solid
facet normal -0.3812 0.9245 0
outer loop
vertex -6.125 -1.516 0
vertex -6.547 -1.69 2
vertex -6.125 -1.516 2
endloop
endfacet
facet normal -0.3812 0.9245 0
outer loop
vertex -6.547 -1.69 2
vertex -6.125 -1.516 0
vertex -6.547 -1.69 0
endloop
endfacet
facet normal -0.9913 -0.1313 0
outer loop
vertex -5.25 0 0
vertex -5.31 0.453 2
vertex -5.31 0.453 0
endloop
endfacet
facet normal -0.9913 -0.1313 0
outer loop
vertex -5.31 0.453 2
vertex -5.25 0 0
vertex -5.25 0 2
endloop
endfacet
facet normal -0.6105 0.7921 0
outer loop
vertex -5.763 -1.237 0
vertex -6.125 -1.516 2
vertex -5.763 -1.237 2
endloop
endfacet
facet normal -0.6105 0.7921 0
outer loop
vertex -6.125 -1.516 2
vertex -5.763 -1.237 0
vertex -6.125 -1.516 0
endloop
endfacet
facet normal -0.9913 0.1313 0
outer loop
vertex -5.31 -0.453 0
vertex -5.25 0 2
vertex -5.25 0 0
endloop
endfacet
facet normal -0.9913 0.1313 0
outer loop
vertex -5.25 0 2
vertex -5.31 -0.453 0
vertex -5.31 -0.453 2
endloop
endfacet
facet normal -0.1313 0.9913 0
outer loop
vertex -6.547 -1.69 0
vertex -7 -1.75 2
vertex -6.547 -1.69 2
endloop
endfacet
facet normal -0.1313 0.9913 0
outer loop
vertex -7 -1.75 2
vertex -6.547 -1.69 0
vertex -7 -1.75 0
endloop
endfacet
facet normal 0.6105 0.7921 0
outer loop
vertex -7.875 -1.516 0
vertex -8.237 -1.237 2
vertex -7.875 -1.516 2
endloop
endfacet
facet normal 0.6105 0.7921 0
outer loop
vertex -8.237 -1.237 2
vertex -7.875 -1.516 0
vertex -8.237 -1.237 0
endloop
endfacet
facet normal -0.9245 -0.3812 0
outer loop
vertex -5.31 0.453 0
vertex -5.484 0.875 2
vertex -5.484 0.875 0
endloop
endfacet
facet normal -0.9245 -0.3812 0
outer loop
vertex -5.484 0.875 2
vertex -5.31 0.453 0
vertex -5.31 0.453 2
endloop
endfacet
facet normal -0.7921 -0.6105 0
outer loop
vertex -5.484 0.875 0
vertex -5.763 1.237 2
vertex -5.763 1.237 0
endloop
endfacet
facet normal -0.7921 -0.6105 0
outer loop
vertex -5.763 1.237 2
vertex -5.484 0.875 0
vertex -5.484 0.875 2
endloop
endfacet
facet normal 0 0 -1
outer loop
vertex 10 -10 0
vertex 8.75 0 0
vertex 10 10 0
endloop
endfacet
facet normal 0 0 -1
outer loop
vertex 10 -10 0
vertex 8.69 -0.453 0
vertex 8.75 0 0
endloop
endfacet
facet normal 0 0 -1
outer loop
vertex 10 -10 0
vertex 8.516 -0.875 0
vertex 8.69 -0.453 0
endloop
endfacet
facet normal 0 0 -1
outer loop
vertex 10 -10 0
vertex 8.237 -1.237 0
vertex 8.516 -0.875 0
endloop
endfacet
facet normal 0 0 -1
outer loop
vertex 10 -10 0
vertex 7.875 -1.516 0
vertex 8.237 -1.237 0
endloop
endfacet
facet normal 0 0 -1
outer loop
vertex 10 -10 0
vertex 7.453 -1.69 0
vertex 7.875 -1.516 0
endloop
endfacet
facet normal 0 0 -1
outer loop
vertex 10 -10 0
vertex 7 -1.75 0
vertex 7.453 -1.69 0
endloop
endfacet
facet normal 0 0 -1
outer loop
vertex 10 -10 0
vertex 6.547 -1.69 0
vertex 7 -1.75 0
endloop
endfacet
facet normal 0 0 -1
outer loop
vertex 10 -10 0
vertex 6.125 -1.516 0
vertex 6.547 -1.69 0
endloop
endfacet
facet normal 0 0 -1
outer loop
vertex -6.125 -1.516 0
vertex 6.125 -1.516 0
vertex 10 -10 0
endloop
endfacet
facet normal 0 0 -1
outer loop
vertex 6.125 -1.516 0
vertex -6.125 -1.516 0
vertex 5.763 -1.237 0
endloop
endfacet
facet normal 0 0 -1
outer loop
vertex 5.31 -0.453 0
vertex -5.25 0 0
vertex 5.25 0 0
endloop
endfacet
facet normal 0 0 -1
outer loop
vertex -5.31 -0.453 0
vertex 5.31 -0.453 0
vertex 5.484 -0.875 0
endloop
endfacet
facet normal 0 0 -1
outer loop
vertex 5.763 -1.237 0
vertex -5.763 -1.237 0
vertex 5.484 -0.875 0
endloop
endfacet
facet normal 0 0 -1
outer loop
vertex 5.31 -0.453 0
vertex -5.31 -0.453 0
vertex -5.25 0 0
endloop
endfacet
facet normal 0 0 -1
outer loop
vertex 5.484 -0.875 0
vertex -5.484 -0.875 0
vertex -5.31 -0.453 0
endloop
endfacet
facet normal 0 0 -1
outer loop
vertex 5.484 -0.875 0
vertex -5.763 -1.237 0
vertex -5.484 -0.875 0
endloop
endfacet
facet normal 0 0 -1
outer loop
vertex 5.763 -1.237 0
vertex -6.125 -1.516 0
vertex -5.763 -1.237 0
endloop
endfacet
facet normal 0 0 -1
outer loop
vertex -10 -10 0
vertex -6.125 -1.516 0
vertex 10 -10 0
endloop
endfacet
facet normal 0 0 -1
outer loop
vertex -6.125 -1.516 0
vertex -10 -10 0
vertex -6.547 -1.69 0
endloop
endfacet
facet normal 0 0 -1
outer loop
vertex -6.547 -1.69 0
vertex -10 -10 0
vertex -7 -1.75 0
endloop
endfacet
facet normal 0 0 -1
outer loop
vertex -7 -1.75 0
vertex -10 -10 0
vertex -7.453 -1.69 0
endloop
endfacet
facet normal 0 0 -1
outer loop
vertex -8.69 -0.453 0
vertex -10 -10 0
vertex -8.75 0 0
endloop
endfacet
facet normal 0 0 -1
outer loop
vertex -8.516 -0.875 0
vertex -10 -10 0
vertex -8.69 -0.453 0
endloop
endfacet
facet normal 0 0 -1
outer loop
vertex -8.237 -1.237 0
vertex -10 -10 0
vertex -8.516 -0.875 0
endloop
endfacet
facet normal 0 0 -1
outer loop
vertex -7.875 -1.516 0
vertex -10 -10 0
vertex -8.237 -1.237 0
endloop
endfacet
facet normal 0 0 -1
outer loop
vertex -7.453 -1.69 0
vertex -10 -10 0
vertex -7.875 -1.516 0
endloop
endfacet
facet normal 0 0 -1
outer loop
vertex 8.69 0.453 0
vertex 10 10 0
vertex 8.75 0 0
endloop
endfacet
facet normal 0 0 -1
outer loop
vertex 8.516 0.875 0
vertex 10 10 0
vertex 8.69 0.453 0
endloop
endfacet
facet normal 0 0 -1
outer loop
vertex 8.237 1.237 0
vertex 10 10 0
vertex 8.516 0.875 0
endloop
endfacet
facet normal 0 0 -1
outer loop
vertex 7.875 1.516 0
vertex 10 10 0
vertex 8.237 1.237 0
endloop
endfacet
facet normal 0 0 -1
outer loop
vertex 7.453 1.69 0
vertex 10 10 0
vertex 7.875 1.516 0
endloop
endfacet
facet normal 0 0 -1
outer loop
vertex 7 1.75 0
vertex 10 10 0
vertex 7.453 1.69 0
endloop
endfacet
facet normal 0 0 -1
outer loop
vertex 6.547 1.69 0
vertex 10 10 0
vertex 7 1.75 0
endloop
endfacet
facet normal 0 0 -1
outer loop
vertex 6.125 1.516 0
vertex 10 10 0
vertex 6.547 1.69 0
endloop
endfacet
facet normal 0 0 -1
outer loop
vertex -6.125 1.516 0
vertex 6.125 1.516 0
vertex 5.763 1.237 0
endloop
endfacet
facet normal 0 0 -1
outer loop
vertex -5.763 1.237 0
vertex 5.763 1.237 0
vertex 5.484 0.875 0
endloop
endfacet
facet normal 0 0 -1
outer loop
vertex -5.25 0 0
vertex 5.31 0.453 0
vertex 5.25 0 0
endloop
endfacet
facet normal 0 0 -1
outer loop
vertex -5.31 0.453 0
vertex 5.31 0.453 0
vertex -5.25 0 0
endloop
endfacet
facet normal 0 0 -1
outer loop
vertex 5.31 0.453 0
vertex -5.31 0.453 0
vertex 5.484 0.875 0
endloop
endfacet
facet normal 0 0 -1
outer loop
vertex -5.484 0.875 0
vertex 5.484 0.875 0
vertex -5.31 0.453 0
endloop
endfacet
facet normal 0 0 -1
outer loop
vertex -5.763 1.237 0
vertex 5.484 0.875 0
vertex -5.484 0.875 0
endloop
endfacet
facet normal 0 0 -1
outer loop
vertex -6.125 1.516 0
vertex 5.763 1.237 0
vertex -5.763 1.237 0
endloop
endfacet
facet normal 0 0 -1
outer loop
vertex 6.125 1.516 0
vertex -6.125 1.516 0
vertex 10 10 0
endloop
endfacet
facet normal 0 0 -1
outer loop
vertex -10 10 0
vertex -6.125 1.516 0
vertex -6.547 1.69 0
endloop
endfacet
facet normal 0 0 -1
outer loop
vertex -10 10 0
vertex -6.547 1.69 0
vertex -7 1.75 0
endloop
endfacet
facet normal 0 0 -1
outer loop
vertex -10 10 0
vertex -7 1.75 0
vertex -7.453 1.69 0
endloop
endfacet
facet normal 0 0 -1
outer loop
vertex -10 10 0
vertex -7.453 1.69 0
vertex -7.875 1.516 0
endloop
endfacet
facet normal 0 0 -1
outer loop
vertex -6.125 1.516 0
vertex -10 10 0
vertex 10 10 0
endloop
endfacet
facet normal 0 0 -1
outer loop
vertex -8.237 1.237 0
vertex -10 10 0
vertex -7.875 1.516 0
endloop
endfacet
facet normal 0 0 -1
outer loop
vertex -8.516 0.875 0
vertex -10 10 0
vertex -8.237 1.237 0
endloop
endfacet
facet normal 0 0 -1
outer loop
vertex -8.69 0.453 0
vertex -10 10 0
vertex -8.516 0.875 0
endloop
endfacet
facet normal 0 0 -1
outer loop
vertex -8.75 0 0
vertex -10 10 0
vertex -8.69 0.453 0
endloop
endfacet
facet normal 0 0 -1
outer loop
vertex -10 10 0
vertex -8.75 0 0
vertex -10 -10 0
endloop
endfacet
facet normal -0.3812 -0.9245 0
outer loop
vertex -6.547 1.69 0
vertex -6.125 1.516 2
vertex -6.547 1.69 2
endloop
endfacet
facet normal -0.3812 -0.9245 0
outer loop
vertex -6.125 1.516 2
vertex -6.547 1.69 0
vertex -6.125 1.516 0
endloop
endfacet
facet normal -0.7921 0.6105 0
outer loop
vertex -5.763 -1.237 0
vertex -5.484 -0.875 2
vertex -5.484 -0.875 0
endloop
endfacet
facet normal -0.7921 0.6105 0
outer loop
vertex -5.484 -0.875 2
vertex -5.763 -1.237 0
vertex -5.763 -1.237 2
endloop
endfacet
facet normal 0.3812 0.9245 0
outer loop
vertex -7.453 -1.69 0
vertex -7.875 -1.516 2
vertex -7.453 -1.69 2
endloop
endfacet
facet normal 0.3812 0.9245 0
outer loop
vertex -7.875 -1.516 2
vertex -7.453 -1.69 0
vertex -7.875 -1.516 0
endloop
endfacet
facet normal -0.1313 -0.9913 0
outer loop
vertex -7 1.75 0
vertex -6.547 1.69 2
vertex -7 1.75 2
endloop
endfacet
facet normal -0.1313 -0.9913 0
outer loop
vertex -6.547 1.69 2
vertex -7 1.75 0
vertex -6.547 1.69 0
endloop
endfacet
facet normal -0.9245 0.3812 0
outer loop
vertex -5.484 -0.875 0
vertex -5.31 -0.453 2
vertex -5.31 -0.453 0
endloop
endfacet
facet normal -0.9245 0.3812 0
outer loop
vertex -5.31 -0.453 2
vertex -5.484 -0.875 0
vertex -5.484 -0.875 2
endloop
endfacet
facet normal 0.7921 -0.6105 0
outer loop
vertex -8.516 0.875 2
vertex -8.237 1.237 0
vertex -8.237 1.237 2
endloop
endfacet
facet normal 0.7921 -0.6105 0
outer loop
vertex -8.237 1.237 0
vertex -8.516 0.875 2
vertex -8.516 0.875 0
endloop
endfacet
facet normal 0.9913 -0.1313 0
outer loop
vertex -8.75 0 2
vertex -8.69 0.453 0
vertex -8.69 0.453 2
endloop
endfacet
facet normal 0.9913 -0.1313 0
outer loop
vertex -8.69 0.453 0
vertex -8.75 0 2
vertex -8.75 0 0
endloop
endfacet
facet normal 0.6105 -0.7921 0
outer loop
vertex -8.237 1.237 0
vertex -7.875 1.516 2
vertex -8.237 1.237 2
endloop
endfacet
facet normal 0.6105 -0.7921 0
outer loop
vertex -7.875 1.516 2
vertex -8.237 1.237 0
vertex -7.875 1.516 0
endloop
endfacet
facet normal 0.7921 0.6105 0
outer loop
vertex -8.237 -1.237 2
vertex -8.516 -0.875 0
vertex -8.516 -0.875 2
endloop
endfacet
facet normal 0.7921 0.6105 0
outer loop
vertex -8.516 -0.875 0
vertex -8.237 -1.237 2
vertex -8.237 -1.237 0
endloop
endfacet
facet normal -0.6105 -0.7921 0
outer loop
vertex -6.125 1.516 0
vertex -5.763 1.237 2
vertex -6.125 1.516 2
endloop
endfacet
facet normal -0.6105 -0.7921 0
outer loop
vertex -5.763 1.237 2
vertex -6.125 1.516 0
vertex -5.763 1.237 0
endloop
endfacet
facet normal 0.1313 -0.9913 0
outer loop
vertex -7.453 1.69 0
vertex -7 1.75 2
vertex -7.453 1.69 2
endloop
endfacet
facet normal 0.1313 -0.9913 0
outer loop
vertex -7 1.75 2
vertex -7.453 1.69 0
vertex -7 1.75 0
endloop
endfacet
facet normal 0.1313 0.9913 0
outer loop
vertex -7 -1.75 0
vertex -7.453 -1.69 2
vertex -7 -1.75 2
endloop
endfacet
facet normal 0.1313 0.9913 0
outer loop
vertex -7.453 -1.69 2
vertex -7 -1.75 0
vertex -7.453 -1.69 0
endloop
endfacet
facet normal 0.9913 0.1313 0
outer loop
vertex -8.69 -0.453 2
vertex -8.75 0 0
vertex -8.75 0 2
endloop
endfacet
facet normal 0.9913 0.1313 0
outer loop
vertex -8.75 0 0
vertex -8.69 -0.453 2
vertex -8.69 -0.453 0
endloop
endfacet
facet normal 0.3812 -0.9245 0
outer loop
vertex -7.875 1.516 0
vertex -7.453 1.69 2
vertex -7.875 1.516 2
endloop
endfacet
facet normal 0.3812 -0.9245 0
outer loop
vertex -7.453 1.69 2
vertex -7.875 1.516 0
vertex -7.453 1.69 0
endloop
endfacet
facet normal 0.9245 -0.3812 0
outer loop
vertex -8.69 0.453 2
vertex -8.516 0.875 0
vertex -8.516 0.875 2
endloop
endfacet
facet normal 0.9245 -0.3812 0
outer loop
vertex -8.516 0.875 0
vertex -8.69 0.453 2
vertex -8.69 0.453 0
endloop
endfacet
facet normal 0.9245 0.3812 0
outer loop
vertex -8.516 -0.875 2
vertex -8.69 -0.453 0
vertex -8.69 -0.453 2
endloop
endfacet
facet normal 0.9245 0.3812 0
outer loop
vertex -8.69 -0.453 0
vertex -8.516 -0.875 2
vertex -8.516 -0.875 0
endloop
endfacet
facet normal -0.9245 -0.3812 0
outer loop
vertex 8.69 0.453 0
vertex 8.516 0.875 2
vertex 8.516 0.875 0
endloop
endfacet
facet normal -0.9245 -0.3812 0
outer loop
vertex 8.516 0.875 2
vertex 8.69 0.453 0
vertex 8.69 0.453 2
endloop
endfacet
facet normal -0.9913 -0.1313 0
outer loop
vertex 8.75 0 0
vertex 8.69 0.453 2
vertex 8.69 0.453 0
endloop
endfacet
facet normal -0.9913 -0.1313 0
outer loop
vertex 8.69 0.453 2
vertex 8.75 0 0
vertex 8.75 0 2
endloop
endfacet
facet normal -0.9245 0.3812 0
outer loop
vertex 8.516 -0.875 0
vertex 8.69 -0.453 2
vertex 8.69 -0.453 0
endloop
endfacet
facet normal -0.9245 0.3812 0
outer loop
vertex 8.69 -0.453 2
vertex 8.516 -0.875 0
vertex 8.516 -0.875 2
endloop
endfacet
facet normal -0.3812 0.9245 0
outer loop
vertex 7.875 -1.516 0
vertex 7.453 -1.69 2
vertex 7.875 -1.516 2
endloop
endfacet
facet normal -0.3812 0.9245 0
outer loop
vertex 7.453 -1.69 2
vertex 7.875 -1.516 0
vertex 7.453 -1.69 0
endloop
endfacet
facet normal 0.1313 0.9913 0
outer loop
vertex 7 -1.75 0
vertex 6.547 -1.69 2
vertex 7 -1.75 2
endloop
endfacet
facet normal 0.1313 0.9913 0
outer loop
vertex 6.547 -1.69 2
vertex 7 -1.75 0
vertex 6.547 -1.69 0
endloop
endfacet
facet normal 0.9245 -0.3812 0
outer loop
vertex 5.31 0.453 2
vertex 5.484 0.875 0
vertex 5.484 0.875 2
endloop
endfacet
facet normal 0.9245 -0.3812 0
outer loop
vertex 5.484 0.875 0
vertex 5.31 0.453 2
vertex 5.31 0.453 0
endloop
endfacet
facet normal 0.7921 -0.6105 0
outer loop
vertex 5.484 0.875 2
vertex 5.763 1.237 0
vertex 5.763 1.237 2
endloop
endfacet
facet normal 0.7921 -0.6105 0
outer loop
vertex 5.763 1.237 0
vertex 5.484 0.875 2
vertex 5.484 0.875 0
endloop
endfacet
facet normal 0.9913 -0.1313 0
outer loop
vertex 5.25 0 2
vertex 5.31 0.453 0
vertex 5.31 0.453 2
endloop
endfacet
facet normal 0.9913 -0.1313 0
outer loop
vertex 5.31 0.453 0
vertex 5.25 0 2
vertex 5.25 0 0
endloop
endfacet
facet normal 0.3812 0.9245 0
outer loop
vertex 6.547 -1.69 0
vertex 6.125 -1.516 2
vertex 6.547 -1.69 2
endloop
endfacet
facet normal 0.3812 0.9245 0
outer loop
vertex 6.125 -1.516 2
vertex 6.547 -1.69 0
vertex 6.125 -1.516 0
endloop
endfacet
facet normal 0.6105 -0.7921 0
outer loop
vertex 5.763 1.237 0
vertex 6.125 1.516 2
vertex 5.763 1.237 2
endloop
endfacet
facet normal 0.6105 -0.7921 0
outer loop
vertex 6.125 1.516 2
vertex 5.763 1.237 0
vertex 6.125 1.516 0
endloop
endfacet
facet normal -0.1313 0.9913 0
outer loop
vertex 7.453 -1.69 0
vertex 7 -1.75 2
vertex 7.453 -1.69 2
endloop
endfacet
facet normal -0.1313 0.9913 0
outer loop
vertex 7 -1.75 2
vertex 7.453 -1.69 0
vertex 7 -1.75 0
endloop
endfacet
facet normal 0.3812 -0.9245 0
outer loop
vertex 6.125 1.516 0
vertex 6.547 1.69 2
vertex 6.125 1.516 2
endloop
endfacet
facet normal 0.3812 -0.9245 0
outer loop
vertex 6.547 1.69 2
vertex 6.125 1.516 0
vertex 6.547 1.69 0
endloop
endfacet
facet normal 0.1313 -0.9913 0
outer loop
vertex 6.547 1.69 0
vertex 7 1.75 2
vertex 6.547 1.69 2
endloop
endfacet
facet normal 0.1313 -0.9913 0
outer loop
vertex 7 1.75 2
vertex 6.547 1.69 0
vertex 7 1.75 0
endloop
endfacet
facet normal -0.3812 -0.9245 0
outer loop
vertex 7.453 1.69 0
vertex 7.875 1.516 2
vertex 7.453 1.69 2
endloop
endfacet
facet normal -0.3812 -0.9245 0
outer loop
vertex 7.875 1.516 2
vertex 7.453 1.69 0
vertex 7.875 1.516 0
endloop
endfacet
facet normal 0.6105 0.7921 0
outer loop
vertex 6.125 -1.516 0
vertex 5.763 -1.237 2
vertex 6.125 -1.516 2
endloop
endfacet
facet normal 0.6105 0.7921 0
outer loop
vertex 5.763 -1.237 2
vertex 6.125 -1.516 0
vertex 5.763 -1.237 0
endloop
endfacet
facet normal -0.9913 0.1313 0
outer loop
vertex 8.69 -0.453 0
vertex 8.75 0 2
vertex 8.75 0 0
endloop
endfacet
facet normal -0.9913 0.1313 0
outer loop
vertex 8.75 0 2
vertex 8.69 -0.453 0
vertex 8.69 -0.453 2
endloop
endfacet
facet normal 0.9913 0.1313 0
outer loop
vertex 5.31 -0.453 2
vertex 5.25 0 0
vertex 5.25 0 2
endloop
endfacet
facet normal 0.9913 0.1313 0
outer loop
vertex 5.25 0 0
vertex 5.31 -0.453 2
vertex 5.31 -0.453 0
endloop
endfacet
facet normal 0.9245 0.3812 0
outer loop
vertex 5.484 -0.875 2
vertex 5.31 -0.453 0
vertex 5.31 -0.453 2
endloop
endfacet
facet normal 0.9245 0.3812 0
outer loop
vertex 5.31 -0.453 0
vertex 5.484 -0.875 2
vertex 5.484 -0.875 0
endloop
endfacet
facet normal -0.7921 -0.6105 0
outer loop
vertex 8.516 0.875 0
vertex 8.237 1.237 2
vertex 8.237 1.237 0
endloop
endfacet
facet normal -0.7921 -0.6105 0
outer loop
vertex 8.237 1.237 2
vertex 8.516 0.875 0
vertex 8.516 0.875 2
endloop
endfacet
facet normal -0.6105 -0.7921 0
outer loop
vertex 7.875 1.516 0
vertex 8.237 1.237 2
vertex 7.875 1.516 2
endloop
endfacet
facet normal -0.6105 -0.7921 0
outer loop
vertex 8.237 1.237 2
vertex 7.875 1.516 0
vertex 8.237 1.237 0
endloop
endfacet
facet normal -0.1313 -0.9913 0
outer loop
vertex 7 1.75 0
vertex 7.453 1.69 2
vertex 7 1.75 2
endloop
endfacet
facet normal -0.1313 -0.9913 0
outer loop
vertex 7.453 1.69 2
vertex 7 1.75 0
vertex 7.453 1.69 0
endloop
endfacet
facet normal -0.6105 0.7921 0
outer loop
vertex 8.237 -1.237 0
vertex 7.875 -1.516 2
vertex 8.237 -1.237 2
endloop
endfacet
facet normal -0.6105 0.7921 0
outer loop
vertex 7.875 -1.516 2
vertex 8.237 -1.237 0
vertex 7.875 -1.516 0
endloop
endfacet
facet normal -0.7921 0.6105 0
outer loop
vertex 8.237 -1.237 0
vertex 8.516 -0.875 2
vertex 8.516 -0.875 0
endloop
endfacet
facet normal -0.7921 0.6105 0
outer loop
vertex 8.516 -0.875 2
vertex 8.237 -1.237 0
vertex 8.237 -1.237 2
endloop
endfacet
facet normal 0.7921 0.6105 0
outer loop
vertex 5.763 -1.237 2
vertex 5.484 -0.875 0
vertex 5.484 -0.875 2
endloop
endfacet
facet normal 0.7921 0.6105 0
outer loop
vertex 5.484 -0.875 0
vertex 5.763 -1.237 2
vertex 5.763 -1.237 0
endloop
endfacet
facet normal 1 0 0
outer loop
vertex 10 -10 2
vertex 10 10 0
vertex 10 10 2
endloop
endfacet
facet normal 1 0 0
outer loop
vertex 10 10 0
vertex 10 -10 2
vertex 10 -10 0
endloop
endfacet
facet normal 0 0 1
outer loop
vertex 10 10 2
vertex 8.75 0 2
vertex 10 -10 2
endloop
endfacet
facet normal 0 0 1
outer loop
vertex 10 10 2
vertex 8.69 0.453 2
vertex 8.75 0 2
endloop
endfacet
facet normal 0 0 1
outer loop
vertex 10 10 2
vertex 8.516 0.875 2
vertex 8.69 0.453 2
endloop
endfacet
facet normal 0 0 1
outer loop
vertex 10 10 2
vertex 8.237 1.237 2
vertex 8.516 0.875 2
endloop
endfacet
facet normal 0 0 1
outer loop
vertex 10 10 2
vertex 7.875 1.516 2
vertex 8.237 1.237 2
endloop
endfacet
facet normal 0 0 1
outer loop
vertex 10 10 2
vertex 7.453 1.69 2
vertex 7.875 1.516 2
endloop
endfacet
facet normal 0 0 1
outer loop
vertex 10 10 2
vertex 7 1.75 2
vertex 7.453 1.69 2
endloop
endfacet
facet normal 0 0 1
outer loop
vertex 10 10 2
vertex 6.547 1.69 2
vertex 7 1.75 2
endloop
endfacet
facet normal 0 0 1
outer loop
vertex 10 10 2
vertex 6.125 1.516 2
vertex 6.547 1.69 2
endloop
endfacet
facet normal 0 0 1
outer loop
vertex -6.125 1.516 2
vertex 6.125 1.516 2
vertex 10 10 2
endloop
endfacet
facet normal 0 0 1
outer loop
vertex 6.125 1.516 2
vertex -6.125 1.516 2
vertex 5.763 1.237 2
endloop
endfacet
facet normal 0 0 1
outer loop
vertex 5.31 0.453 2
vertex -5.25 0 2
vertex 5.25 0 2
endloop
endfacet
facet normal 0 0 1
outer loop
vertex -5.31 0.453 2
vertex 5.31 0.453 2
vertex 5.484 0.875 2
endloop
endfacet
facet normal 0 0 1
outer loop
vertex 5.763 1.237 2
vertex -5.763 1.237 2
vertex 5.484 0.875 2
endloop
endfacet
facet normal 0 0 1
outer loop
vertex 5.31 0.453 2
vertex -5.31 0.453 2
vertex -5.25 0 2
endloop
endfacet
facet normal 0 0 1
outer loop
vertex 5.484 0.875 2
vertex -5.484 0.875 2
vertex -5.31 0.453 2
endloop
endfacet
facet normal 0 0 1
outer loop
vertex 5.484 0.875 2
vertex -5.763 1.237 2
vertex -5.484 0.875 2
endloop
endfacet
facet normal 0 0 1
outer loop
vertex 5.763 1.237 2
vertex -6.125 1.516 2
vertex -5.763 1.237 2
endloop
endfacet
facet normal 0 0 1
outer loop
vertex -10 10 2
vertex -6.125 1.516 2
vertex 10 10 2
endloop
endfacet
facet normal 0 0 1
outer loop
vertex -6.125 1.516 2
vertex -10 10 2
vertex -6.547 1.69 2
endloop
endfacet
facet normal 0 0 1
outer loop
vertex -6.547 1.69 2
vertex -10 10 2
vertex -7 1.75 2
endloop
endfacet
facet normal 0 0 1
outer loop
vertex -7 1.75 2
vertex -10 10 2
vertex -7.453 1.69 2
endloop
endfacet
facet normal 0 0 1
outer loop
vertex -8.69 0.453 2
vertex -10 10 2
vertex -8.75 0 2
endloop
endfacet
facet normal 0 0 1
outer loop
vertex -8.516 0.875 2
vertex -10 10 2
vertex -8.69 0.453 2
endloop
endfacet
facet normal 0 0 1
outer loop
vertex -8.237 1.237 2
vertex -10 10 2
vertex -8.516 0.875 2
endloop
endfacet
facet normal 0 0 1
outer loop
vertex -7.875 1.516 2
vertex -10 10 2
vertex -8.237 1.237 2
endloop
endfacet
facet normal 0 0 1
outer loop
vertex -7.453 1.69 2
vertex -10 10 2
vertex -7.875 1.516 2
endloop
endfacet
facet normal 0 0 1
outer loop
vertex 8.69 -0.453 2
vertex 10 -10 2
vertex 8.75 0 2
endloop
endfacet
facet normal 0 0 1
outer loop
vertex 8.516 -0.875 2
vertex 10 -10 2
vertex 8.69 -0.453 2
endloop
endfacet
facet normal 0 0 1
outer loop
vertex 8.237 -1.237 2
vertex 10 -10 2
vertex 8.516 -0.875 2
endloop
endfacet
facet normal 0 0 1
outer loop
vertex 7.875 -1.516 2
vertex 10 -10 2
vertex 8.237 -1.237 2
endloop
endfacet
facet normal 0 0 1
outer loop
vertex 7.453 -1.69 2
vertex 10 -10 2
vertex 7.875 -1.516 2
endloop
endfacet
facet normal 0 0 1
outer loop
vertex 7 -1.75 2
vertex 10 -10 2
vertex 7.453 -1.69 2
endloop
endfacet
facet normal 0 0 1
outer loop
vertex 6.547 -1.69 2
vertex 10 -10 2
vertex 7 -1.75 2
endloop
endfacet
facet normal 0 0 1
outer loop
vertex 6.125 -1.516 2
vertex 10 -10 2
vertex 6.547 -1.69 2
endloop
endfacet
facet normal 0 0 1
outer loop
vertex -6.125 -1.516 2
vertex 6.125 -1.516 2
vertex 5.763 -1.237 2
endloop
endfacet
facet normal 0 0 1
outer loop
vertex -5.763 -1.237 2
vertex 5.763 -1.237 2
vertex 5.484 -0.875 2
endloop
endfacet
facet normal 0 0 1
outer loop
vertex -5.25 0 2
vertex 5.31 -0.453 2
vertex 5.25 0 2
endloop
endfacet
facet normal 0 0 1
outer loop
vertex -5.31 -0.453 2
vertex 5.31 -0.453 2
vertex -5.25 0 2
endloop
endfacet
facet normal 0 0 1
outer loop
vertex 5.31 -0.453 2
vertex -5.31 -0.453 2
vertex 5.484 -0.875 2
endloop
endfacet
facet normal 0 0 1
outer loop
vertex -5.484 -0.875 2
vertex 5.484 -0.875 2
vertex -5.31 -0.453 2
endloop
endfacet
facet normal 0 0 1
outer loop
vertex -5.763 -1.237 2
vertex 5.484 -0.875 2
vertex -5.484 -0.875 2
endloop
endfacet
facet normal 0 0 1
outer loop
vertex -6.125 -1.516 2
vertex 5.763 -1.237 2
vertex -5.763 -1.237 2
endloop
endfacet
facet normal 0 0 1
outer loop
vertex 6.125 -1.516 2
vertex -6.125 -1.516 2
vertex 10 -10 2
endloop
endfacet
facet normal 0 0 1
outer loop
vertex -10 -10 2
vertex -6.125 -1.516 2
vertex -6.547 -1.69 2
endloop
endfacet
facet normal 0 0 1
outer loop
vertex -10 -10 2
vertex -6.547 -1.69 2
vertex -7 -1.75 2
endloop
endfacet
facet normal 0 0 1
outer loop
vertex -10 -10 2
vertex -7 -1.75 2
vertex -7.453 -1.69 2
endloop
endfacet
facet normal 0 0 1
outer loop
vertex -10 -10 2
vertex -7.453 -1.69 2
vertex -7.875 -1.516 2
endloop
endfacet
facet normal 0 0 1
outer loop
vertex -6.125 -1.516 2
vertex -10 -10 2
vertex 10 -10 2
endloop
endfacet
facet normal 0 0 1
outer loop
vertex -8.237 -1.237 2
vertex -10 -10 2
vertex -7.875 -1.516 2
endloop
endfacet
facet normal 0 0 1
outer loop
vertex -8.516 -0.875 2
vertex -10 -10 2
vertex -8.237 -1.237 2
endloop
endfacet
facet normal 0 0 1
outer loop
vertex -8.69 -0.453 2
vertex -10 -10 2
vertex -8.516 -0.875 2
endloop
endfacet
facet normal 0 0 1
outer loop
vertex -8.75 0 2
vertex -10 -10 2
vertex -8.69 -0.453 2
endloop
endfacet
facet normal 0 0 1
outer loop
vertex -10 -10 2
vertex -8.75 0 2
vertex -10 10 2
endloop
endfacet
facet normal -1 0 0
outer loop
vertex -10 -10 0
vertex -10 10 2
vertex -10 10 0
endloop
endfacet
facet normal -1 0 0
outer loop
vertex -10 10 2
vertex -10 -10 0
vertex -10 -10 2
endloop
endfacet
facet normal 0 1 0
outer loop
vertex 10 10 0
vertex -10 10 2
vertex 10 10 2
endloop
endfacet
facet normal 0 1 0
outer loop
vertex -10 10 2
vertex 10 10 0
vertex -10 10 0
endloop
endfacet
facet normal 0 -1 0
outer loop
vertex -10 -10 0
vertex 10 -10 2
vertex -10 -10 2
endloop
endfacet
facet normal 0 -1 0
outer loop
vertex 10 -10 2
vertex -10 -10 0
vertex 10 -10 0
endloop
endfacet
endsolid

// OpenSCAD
difference()
{
    union()
    {
        translate([-10,-10,0])
            cube([20,20,2]);
    }
    
    union()
    {
        translate([-7,0,0])
            cylinder(d=3.5,h=4,$fn=24);
        translate([7,0,0])
            cylinder(d=3.5,h=4,$fn=24);
    }
}
